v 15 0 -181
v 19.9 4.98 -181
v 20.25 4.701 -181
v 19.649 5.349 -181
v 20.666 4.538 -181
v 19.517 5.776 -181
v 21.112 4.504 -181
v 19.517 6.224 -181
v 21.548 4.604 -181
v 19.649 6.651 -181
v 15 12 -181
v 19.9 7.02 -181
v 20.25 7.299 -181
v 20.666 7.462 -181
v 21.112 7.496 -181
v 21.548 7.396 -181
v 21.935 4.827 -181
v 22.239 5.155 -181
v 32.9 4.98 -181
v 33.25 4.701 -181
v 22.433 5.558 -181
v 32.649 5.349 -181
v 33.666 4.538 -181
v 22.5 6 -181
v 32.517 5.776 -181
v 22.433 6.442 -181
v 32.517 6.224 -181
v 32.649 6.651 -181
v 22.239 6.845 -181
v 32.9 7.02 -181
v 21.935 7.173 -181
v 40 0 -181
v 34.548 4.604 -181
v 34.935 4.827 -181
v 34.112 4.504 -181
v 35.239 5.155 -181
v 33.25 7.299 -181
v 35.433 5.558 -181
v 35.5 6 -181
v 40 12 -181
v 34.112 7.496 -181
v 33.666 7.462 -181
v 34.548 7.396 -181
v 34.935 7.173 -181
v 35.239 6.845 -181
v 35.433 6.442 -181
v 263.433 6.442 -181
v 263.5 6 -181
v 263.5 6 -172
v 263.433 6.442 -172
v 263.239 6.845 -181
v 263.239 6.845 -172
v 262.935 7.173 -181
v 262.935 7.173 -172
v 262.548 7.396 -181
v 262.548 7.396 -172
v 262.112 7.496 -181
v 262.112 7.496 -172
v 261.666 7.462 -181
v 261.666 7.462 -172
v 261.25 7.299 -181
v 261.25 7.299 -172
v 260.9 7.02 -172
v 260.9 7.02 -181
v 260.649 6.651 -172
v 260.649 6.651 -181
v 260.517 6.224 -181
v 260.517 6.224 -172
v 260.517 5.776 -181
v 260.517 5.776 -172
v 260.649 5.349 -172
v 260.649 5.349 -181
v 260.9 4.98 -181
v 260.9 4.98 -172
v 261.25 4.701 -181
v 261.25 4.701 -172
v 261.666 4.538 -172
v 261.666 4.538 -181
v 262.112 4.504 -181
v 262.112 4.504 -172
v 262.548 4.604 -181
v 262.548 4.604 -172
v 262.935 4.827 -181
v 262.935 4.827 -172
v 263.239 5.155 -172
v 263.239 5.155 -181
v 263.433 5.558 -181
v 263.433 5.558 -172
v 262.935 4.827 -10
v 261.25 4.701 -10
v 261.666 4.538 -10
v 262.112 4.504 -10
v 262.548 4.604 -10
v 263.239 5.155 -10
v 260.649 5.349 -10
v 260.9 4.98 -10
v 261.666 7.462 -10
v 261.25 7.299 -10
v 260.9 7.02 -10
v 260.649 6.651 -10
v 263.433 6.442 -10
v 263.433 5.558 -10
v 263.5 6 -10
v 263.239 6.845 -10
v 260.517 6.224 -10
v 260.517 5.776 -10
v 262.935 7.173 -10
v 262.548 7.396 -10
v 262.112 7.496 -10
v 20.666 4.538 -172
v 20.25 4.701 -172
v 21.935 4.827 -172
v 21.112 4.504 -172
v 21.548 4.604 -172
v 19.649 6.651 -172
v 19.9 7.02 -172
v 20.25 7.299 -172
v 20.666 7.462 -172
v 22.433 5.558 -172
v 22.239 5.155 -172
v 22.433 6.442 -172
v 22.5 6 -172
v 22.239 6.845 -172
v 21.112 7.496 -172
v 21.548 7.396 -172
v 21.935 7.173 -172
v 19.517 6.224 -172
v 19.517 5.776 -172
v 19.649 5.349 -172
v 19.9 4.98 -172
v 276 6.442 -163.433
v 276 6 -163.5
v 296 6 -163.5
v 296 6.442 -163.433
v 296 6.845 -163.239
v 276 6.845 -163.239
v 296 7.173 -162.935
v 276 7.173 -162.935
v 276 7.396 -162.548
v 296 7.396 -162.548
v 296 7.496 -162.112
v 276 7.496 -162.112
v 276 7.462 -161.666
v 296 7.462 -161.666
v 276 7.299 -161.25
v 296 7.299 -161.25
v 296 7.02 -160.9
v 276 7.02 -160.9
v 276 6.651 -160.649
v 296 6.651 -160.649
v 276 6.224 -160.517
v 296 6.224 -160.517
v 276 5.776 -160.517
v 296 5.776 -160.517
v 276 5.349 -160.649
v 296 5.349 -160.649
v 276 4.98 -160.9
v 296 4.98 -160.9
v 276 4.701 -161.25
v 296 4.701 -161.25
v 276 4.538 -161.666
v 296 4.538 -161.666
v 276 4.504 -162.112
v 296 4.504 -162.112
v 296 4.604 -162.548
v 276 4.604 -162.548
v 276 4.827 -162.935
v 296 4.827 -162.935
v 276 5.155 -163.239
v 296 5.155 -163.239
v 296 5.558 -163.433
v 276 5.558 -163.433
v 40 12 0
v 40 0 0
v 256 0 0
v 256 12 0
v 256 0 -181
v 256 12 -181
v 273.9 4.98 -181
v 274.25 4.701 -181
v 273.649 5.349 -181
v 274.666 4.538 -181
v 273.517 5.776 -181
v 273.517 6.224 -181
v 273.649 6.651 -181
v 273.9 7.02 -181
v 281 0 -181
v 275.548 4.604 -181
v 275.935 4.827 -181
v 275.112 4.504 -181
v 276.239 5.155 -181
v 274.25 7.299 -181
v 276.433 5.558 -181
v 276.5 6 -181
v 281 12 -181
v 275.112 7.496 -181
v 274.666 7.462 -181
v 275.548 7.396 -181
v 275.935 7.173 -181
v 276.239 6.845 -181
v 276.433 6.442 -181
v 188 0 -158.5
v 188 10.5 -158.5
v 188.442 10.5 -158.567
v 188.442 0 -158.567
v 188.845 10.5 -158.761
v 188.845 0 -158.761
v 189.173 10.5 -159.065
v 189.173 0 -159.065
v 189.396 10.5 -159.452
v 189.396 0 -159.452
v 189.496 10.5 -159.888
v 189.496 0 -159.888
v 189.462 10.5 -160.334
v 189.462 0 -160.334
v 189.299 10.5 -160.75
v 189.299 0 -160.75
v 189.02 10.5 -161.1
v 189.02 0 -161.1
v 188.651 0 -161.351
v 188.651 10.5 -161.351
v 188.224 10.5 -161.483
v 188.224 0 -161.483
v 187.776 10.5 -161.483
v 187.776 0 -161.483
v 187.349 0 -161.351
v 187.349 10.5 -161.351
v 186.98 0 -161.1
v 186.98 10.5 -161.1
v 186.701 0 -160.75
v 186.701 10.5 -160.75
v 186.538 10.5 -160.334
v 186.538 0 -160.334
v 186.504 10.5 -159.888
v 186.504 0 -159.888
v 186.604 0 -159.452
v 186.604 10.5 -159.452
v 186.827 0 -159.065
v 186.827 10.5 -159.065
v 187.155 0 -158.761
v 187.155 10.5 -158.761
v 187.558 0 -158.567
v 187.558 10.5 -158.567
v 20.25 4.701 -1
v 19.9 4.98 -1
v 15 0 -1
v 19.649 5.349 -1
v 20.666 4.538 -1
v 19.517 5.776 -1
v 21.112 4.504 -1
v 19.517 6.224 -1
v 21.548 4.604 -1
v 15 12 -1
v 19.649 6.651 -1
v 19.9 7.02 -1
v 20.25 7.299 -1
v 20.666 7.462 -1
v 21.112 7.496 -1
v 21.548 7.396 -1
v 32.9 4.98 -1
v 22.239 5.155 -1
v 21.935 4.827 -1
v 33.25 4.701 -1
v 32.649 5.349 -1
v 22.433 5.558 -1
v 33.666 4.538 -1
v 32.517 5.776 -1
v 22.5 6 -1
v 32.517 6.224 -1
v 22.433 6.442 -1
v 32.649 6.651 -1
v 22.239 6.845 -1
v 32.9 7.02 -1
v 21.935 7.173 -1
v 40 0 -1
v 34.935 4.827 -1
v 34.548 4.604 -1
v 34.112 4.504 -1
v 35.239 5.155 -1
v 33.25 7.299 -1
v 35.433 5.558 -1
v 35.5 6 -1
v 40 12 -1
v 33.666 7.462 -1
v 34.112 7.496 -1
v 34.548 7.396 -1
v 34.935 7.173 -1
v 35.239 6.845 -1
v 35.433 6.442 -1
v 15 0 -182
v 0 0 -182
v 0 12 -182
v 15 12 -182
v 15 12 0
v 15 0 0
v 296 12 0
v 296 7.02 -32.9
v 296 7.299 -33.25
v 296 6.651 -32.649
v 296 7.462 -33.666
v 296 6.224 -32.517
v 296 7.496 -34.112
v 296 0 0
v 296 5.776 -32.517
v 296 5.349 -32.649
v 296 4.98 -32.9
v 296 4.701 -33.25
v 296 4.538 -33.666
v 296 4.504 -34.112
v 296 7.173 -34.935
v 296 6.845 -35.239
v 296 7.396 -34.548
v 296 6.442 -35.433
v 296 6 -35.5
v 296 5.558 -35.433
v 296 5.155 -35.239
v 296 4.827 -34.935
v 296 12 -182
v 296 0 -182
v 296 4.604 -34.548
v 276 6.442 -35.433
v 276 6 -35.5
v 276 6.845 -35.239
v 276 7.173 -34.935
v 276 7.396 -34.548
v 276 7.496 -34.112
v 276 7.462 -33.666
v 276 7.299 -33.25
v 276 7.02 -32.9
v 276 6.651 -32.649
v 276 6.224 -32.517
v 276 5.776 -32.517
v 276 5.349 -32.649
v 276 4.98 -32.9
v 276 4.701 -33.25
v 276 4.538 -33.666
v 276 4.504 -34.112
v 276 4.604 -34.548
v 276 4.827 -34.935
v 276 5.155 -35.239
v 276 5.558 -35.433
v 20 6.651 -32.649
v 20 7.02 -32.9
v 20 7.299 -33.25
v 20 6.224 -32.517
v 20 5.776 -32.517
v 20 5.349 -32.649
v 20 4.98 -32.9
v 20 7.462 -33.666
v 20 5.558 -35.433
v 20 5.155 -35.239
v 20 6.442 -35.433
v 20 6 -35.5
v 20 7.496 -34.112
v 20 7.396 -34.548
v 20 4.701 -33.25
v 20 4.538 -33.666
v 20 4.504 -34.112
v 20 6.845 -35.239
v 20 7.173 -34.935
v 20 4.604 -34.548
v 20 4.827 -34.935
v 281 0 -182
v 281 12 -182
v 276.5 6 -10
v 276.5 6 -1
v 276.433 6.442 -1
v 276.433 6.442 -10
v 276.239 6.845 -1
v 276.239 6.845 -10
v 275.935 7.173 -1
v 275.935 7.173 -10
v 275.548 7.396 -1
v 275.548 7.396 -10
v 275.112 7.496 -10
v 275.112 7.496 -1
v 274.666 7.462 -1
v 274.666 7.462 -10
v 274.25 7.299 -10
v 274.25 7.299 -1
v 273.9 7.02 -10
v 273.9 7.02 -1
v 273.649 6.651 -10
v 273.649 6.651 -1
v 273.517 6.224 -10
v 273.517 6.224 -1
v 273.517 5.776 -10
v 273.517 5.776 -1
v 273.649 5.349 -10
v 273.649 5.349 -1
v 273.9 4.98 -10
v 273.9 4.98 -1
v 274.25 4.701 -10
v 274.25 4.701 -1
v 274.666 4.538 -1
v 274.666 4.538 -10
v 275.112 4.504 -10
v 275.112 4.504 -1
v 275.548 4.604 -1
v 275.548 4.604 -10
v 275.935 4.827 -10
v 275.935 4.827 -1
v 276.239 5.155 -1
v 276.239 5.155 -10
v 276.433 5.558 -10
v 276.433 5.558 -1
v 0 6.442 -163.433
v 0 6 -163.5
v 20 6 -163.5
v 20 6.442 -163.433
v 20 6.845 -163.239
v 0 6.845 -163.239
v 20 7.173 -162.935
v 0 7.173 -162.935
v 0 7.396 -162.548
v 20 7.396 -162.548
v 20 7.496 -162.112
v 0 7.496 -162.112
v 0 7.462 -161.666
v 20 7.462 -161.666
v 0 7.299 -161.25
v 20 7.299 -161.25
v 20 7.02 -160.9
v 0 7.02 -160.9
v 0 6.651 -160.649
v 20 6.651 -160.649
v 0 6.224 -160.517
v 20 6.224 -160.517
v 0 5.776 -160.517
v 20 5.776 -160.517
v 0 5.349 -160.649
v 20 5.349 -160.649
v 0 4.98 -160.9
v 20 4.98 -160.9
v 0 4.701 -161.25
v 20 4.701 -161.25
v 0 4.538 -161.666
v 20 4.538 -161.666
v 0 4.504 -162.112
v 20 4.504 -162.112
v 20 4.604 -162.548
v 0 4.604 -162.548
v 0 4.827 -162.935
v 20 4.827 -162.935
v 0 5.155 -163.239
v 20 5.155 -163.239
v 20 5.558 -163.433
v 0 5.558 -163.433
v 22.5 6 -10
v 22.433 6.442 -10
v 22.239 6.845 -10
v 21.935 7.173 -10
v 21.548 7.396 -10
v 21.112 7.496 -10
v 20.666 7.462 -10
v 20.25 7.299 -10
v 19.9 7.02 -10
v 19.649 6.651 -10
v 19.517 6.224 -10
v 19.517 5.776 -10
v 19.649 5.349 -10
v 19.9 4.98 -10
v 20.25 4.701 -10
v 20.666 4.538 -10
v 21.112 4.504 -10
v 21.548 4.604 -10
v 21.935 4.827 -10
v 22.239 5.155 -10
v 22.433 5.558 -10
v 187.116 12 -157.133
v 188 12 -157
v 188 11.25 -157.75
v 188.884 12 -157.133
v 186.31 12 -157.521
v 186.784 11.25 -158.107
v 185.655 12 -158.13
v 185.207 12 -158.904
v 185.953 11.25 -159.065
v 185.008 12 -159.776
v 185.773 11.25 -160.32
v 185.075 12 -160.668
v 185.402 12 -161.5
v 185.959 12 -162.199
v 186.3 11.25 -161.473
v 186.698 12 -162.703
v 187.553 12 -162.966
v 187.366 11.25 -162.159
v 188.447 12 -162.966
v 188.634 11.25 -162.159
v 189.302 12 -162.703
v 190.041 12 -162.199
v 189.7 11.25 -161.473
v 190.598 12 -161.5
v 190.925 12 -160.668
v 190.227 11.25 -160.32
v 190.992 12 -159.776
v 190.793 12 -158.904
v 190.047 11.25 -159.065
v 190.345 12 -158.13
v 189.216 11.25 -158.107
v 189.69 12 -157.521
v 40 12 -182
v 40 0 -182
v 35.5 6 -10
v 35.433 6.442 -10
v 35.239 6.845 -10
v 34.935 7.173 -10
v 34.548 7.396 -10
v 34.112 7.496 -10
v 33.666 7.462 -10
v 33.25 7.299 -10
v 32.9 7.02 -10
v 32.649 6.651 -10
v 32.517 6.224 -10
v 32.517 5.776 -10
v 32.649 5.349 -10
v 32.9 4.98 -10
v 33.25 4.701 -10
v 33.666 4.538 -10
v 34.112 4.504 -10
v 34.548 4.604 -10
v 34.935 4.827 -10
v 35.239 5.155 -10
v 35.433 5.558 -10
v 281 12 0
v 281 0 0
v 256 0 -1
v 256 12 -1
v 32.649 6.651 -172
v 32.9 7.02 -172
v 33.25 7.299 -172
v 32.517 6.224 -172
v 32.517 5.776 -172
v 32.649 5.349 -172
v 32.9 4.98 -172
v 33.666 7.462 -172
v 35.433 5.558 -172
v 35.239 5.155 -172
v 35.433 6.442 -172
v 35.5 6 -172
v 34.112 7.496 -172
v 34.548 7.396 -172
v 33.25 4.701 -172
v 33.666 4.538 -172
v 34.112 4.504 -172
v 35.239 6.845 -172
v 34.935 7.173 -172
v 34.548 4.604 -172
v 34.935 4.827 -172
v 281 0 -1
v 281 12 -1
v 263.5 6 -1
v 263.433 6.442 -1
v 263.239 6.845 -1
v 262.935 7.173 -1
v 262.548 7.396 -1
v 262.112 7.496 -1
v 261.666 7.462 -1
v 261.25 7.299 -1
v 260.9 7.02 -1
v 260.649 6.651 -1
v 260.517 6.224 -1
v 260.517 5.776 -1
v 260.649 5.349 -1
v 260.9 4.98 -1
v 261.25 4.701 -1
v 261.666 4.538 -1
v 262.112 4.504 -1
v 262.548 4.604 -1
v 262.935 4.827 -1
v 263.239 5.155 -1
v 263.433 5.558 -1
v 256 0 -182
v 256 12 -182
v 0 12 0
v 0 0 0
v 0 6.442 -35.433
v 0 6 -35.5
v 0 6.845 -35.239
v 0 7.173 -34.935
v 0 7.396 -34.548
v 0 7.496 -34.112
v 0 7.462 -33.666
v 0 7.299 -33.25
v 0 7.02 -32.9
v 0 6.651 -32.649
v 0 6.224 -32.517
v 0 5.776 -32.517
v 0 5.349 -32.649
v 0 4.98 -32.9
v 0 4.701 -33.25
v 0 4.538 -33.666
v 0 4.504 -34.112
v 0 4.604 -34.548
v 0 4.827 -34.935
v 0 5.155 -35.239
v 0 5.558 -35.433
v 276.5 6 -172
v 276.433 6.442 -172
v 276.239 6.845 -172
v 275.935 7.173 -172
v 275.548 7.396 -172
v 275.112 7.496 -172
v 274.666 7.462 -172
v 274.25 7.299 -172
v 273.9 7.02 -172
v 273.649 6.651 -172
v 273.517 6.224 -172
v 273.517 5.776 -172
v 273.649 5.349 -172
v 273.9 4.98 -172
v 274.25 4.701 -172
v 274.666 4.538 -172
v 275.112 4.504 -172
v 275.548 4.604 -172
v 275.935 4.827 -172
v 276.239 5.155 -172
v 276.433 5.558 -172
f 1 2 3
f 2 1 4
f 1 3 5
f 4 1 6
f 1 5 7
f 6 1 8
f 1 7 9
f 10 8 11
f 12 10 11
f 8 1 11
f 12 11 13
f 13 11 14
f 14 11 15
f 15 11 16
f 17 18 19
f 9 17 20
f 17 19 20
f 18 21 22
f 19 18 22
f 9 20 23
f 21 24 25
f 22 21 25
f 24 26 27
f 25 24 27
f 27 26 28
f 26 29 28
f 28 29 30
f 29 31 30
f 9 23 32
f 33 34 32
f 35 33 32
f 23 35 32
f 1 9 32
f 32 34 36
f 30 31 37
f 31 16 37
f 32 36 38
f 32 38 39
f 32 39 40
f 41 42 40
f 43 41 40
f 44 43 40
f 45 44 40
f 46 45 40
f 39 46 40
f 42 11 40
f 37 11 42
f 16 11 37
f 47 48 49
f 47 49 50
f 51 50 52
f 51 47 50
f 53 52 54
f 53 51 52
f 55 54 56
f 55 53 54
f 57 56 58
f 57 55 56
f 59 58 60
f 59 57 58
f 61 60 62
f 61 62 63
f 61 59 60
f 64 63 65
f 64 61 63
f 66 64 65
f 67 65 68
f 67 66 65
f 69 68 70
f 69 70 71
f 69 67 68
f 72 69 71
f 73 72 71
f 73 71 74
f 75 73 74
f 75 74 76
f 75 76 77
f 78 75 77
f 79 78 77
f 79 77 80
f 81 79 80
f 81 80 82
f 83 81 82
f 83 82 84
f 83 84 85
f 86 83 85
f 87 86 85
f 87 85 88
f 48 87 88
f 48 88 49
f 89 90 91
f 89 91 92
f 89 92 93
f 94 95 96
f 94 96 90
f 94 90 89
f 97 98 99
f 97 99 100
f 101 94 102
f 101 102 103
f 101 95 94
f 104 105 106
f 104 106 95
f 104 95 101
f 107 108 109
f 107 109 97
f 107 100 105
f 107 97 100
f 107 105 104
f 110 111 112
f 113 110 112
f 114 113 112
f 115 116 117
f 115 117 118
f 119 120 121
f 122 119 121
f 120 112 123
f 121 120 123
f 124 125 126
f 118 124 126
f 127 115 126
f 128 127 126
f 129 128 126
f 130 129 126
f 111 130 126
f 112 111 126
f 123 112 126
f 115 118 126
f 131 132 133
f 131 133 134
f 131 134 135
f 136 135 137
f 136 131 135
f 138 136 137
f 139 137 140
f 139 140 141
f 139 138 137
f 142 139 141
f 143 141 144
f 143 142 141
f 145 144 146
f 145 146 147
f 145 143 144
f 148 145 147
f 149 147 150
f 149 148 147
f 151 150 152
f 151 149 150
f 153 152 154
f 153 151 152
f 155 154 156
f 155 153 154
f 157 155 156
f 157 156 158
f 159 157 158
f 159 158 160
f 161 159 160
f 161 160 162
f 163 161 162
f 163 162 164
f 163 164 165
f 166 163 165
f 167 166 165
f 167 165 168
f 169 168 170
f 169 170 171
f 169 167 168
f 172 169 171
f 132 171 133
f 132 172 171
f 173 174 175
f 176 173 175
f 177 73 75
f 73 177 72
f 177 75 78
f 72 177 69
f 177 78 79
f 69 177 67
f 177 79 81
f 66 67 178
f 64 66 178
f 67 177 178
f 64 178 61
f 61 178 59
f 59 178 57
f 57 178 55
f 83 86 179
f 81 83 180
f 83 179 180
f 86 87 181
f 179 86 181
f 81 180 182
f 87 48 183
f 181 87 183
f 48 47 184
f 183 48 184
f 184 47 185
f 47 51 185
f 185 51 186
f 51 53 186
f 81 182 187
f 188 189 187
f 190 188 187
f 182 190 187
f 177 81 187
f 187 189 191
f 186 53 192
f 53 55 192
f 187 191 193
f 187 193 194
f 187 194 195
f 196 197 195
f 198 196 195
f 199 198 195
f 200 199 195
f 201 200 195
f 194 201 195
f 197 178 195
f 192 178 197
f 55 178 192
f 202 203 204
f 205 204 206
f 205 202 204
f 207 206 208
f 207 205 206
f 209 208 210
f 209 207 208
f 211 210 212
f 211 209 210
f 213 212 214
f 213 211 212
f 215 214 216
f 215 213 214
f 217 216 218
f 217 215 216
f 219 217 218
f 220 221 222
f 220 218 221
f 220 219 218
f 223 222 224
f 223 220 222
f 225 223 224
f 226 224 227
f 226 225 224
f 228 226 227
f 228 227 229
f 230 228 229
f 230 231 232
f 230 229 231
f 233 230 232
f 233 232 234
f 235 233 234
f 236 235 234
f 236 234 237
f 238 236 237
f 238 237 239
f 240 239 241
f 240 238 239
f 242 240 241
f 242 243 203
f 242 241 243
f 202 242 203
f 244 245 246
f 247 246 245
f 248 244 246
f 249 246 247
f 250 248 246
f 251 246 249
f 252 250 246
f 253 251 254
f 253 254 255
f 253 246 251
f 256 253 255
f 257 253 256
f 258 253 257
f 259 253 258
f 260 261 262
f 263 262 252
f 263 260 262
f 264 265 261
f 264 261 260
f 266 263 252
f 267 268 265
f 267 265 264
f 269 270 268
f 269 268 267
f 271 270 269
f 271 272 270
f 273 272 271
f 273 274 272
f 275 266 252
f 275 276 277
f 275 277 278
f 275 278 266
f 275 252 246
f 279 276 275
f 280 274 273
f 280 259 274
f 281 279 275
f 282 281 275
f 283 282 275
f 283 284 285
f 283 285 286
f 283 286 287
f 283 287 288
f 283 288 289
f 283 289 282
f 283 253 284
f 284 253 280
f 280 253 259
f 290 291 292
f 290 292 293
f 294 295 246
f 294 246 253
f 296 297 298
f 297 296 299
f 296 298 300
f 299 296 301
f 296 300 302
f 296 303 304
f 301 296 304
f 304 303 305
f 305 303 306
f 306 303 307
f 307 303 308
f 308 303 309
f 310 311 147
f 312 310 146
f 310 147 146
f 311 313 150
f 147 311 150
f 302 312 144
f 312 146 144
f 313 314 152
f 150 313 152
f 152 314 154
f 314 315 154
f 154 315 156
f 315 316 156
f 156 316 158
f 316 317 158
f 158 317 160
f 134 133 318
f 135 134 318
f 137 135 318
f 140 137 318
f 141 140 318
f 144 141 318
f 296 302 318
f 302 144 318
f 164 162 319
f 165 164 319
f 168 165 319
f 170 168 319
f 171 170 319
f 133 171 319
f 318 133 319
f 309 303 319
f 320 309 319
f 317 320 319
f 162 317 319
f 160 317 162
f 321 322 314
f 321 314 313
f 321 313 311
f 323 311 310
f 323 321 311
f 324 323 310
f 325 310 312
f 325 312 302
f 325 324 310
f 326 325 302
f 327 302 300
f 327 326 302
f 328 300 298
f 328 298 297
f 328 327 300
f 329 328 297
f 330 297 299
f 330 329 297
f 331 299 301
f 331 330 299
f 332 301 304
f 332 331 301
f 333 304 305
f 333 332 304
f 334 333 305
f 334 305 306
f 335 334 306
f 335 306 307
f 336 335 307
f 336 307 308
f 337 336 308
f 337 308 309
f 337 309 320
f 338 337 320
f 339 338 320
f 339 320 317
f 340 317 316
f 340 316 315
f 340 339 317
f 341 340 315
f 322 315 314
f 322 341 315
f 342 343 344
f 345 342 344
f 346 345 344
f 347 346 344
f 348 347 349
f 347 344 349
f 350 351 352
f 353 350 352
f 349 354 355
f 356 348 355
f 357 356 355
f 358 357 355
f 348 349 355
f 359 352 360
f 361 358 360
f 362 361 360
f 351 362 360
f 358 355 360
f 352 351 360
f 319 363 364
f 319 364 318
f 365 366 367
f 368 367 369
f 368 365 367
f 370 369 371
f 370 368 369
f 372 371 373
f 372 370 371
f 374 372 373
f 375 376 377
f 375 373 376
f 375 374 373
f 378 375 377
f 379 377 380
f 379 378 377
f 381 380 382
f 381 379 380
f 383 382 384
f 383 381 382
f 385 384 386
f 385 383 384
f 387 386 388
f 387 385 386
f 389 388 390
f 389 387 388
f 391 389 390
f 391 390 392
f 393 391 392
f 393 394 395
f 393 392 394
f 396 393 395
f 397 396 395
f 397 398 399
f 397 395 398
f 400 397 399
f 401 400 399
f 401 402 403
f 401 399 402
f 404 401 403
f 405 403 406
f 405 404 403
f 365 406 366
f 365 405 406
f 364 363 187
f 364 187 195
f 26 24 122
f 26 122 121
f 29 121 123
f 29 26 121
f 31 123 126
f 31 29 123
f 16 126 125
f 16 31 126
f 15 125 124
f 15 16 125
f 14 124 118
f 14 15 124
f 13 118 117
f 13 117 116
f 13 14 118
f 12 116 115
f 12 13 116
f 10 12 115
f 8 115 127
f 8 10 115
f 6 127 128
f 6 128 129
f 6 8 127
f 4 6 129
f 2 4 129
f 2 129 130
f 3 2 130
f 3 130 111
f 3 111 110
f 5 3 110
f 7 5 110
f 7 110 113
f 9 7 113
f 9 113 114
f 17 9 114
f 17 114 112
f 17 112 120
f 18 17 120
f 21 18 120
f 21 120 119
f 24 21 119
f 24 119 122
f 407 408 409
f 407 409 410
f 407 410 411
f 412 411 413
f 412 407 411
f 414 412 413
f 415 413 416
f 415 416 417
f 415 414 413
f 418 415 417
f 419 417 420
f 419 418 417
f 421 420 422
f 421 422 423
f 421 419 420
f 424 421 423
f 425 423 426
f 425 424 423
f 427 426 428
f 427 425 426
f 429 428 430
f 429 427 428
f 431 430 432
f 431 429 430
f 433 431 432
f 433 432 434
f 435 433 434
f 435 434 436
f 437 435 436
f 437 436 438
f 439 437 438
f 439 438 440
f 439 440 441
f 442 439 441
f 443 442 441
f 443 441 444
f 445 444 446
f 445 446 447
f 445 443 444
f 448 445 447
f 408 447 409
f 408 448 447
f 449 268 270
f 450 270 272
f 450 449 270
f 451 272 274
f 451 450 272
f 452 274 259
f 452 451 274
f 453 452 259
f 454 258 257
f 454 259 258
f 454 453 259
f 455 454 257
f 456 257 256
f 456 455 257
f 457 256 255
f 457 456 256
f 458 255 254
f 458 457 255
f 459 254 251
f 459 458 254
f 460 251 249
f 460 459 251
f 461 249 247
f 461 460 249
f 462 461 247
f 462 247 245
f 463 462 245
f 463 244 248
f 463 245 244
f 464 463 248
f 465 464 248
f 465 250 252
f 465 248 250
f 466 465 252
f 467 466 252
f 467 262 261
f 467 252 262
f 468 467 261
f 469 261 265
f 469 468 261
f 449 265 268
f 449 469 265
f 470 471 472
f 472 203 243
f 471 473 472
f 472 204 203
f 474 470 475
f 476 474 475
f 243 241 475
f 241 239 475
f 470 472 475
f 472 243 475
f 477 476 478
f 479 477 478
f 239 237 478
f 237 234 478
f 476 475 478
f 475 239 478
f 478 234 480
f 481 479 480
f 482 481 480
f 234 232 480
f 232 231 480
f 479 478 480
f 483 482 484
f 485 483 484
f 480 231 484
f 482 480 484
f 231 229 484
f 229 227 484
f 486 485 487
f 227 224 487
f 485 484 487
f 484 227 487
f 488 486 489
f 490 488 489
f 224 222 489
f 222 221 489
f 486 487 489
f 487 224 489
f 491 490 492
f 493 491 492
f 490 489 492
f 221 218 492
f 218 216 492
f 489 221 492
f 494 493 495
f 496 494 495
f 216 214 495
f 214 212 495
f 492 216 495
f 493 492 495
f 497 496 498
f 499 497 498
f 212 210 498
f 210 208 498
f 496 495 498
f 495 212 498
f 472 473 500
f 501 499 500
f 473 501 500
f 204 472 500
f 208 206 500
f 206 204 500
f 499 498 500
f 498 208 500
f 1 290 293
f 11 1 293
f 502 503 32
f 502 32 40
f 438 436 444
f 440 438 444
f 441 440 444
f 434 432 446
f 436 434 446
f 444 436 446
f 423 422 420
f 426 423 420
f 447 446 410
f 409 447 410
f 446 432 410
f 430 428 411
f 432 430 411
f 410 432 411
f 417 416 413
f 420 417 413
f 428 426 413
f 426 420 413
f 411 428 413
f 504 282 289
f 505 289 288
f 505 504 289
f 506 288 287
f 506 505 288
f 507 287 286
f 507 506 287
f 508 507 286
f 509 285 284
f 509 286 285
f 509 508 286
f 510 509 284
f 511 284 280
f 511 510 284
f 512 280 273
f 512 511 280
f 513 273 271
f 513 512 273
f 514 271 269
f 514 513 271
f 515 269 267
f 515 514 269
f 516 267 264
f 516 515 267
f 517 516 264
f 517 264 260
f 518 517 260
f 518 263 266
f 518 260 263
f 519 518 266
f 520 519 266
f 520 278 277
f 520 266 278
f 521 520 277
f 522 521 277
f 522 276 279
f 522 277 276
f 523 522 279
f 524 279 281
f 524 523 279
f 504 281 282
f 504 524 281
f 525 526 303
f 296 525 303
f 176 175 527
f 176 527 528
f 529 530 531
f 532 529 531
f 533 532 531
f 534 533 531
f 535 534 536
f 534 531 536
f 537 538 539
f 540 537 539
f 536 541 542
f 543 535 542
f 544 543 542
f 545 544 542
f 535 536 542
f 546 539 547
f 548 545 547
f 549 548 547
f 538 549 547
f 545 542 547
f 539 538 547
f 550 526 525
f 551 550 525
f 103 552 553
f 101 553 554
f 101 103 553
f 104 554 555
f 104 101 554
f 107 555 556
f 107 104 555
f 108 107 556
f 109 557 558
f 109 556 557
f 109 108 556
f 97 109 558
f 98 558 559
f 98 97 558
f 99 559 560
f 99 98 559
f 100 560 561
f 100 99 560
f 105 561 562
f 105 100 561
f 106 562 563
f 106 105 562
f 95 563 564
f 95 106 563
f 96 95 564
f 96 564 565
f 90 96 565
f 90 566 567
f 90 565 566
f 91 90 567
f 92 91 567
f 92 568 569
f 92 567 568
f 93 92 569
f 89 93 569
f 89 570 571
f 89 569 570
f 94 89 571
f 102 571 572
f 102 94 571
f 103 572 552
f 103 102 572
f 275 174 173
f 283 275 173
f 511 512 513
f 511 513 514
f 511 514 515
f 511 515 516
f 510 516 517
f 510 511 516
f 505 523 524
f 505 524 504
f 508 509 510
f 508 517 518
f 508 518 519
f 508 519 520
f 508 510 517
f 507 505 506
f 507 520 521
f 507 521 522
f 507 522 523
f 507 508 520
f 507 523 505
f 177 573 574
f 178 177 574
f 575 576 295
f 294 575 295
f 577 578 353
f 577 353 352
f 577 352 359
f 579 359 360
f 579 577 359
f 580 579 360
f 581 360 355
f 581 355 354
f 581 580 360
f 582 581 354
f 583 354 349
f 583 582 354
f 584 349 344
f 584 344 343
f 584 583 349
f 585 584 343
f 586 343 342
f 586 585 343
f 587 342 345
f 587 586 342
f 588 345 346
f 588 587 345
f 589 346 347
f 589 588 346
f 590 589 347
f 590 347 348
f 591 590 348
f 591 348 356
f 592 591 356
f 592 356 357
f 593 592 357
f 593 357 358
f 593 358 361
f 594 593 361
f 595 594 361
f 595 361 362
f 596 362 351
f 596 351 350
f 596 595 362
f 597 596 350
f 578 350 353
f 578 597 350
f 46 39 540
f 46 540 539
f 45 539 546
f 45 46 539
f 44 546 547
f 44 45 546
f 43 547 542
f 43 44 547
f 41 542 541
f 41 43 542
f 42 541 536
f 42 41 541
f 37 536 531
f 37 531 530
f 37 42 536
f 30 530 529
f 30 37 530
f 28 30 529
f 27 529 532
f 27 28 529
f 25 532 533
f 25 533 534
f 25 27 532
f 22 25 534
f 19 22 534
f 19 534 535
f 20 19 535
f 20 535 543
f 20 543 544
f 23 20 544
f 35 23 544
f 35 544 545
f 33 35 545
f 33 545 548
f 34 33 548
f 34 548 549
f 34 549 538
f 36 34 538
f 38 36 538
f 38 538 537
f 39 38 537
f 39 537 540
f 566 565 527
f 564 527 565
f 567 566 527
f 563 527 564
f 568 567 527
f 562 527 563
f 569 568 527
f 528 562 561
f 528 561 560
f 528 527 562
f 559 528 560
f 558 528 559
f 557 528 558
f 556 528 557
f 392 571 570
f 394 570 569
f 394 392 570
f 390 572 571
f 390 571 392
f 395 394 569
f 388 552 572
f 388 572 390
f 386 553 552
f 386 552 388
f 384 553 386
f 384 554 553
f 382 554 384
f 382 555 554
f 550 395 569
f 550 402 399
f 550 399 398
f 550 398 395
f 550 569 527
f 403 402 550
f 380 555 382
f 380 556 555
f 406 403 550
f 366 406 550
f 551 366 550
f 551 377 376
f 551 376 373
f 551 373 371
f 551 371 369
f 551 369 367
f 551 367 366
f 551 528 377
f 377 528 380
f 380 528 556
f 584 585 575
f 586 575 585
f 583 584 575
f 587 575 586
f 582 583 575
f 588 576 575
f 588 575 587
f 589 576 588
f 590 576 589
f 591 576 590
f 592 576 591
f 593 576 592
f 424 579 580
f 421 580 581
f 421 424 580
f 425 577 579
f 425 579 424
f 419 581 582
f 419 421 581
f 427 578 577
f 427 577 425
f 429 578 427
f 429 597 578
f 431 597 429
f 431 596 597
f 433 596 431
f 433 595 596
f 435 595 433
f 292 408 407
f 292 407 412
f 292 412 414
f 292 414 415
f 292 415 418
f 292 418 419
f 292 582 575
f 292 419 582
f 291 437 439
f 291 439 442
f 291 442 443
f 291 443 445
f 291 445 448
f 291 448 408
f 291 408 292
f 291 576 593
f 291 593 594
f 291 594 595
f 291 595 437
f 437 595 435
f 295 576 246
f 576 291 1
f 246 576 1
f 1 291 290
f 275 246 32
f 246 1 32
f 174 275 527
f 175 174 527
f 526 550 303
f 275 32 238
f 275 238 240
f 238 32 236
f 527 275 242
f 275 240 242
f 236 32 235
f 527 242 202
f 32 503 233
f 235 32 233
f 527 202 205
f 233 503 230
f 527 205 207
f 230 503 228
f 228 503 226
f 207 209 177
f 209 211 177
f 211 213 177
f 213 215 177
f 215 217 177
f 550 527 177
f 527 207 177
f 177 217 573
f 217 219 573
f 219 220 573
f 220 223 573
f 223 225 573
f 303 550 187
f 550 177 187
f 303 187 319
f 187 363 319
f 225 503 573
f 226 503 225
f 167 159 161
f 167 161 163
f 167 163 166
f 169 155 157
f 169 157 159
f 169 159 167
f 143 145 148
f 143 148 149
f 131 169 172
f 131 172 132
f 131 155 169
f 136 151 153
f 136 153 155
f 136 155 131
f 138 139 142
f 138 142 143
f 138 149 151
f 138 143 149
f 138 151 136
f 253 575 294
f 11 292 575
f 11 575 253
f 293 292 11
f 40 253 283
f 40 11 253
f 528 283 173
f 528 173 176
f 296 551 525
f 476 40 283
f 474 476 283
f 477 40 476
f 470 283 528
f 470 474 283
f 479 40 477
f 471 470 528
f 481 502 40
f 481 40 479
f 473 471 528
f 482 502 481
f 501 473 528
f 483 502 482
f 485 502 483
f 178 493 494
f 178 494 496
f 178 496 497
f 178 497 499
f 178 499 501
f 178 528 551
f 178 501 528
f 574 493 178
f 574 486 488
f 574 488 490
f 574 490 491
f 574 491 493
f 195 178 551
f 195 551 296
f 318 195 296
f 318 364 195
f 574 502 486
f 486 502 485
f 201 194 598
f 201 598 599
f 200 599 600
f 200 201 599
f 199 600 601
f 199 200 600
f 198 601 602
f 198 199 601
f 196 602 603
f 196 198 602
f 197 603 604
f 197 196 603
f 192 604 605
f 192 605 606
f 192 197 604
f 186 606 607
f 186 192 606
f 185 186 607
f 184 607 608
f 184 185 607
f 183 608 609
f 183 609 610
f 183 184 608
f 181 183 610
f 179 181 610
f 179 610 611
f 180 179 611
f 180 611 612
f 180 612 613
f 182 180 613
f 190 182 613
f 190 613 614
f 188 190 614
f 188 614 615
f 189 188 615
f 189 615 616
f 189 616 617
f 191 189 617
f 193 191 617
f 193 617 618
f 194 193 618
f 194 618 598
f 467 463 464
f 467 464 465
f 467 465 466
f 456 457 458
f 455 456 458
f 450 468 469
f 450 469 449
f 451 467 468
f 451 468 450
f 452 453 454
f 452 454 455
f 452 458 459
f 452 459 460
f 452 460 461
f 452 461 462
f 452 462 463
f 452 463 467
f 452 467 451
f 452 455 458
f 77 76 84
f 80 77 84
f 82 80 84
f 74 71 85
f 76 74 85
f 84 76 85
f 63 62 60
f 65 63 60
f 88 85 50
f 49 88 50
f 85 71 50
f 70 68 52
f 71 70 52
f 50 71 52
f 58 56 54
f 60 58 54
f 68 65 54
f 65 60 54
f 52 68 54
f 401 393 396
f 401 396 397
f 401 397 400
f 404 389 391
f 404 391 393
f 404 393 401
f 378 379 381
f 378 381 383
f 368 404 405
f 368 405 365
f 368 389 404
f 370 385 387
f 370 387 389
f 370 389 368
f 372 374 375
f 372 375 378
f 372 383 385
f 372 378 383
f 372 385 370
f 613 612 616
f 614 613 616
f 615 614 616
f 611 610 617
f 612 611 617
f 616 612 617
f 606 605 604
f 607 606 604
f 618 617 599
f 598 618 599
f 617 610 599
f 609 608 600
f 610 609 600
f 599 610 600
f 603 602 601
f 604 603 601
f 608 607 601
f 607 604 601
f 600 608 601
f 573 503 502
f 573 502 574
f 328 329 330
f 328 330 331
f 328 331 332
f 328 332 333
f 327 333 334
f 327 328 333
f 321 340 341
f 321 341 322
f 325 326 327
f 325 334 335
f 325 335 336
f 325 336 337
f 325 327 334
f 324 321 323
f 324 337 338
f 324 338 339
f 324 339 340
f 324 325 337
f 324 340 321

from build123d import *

# Parameters (mm, degrees)
SKETCH1_W           = 296
SKETCH1_H           = 182
SKETCH1_R           = 1.5
BOSS_EXTRUDE1_DEPTH = 12
SKETCH2_R           = 1.5
CUT_EXTRUDE1_DEPTH  = 20
CUT_EXTRUDE2_START  = 276
SKETCH2_2_R         = 1.5
CUT_EXTRUDE2_DEPTH  = 20
CUT_EXTRUDE4_START  = -182
SKETCH5_R           = 1.5
CUT_EXTRUDE4_DEPTH  = 10
CUT_EXTRUDE5_START  = -10
SKETCH5_3_R         = 1.5
CUT_EXTRUDE5_DEPTH  = 10
SKETCH7_W           = 25
SKETCH7_H           = 12
CUT_EXTRUDE6_DEPTH  = 1
CUT_EXTRUDE7_START  = -182
SKETCH7_2_W         = 25
SKETCH7_2_H         = 12
CUT_EXTRUDE7_DEPTH  = 1


with BuildPart() as part:
    # Sketch1 → Boss-Extrude1 (new body)
    with BuildSketch(Plane(origin=(0, 0, 0), x_dir=(1, 0, 0), z_dir=(0, 1, 0))):
        with Locations((148, 91)):
            Rectangle(SKETCH1_W, SKETCH1_H)
        with Locations(Location((188, 160, 0), (0, 0, 270))):
            Circle(SKETCH1_R, mode=Mode.SUBTRACT)
    extrude(amount=BOSS_EXTRUDE1_DEPTH)

    # Sketch2 → Cut-Extrude1 (cut)
    with BuildSketch(Plane(origin=(0, 0, 0), x_dir=(0, 0, -1), z_dir=(1, 0, 0))):
        with Locations((162, 6)):
            Circle(SKETCH2_R)
        with Locations((34, 6)):
            Circle(SKETCH2_R)
    extrude(amount=CUT_EXTRUDE1_DEPTH, mode=Mode.SUBTRACT)

    # Sketch2<2> → Cut-Extrude2 (cut)
    with BuildSketch(Plane(origin=(0, 0, 0), x_dir=(0, 0, -1), z_dir=(1, 0, 0)).offset(CUT_EXTRUDE2_START)):
        with Locations((162, 6)):
            Circle(SKETCH2_2_R)
        with Locations((34, 6)):
            Circle(SKETCH2_2_R)
    extrude(amount=CUT_EXTRUDE2_DEPTH, mode=Mode.SUBTRACT)

    # Cut-Extrude3 cone 1 section (through the dimple's axis) → Cut-Extrude3 (revolve, cut)
    with BuildSketch(Plane(origin=(188, 12, -160), x_dir=(0, 0, 1), z_dir=(1, 0, 0))):
        Polygon((0, 0), (3, 0), (0, 3), align=None)
    revolve(axis=Axis((188, 12, -160), (0, -1, 0)), mode=Mode.SUBTRACT)

    # Sketch5 → Cut-Extrude4 (cut)
    with BuildSketch(Plane.XY.offset(CUT_EXTRUDE4_START)):
        with Locations((21, 6)):
            Circle(SKETCH5_R)
        with Locations((34, 6)):
            Circle(SKETCH5_R)
        with Locations((275, 6)):
            Circle(SKETCH5_R)
        with Locations((262, 6)):
            Circle(SKETCH5_R)
    extrude(amount=CUT_EXTRUDE4_DEPTH, mode=Mode.SUBTRACT)

    # Sketch5<3> → Cut-Extrude5 (cut)
    with BuildSketch(Plane.XY.offset(CUT_EXTRUDE5_START)):
        with Locations((21, 6)):
            Circle(SKETCH5_3_R)
        with Locations((34, 6)):
            Circle(SKETCH5_3_R)
        with Locations((275, 6)):
            Circle(SKETCH5_3_R)
        with Locations((262, 6)):
            Circle(SKETCH5_3_R)
    extrude(amount=CUT_EXTRUDE5_DEPTH, mode=Mode.SUBTRACT)

    # Sketch7 → Cut-Extrude6 (cut)
    with BuildSketch(Plane.XY):
        with Locations((27.5, 6)):
            Rectangle(SKETCH7_W, SKETCH7_H)
        with Locations((268.5, 6)):
            Rectangle(SKETCH7_W, SKETCH7_H)
    extrude(amount=-CUT_EXTRUDE6_DEPTH, mode=Mode.SUBTRACT)

    # Sketch7<2> → Cut-Extrude7 (cut)
    with BuildSketch(Plane.XY.offset(CUT_EXTRUDE7_START)):
        with Locations((27.5, 6)):
            Rectangle(SKETCH7_2_W, SKETCH7_2_H)
        with Locations((268.5, 6)):
            Rectangle(SKETCH7_2_W, SKETCH7_2_H)
    extrude(amount=CUT_EXTRUDE7_DEPTH, mode=Mode.SUBTRACT)


solid = part.part
